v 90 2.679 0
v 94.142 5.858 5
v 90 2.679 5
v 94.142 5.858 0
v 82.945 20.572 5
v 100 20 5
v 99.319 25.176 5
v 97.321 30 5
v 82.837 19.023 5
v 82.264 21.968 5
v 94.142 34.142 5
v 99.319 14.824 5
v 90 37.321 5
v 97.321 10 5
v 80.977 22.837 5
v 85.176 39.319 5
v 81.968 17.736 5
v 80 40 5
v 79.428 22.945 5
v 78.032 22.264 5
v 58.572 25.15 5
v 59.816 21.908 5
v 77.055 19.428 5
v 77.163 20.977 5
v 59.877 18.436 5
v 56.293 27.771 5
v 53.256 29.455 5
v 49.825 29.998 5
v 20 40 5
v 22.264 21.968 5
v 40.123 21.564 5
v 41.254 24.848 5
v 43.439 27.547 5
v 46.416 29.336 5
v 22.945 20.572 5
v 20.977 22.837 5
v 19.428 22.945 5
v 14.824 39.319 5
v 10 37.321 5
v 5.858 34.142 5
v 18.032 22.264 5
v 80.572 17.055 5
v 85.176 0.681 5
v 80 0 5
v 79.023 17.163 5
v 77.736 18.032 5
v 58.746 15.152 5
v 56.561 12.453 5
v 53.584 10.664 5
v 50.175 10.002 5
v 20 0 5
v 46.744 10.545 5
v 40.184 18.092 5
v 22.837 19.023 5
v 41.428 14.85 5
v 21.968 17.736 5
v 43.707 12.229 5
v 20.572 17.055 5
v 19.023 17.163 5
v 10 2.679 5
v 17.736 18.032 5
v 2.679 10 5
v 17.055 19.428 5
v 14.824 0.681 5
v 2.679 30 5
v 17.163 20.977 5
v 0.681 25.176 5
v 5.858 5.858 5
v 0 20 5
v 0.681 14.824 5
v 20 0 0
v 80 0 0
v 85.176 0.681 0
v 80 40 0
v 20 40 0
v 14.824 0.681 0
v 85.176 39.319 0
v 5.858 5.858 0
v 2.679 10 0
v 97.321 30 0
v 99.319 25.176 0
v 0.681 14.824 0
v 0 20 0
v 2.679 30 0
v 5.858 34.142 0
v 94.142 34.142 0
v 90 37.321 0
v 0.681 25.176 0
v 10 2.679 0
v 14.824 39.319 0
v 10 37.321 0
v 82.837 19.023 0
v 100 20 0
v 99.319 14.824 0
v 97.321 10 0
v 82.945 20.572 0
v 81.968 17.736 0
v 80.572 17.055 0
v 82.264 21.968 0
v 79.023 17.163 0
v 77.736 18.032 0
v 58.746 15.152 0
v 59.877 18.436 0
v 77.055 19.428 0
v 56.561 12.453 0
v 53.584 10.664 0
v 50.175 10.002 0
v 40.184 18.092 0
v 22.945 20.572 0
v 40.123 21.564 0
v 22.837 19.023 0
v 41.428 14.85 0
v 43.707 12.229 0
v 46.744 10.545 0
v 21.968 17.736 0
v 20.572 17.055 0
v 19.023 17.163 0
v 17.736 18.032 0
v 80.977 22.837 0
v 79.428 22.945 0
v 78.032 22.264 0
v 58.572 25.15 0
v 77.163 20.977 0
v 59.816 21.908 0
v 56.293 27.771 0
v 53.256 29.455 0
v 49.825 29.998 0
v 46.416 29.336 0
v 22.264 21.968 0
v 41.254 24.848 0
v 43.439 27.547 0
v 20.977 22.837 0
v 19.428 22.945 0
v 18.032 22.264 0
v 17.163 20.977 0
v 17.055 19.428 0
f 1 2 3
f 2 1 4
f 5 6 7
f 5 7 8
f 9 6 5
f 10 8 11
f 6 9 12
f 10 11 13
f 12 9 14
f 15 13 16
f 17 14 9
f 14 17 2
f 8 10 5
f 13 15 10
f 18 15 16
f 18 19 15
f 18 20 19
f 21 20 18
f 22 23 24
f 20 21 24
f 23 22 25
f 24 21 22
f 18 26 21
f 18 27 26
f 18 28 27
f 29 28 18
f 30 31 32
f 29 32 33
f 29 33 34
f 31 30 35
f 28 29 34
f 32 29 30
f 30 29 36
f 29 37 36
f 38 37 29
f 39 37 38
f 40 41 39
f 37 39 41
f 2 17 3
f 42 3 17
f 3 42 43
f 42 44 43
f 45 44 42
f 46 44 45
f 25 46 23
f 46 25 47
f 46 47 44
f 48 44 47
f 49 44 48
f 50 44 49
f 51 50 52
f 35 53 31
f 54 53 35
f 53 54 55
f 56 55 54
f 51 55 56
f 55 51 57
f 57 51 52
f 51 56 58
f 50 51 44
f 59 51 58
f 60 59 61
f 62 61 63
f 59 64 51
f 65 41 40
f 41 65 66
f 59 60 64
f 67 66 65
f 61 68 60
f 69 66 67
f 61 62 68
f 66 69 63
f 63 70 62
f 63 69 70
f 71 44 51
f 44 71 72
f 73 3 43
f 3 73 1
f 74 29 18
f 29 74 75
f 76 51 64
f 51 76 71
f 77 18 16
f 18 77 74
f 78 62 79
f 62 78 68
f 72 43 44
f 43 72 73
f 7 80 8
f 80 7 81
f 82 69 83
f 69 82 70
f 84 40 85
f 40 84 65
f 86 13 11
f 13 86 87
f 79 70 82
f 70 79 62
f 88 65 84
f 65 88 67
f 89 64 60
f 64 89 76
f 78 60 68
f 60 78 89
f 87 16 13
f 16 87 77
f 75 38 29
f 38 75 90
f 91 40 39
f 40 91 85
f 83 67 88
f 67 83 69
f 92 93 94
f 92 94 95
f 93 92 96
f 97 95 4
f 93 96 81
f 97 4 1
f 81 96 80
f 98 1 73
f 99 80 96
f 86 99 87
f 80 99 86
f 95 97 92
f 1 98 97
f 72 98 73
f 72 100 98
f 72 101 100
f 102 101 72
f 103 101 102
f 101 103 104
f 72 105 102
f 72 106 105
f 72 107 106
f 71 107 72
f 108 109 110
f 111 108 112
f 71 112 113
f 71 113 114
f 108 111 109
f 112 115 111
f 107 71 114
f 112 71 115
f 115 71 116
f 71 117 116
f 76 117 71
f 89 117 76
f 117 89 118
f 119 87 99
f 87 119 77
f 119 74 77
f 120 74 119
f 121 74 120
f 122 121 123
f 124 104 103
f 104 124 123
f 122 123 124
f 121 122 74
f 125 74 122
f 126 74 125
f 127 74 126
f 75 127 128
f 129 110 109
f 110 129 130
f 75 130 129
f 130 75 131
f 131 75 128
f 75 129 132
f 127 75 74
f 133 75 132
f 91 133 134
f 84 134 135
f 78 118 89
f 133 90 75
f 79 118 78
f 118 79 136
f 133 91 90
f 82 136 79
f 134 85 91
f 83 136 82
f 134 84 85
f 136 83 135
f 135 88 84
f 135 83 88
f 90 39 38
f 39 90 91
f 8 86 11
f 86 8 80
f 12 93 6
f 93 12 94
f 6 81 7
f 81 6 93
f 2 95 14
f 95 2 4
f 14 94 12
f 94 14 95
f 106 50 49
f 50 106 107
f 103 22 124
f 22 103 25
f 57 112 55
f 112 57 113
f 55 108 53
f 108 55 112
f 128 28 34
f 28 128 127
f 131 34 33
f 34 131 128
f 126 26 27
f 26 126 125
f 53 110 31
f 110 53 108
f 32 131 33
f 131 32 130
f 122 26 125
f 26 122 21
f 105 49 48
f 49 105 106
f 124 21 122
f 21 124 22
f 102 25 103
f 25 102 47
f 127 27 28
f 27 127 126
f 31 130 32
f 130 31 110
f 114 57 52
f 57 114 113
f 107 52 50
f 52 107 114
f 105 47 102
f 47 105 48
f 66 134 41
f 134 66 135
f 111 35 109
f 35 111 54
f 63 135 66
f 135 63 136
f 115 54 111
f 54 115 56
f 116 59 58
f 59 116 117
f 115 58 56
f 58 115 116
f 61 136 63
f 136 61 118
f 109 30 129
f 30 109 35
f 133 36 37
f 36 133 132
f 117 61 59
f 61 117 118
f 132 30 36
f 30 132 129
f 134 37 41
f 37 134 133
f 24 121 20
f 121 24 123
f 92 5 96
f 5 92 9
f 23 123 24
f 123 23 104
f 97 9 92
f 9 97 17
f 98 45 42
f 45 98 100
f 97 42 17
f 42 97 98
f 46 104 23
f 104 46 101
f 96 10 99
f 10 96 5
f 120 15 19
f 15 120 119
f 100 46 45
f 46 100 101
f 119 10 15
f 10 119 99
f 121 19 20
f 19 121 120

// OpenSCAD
$fn = 32;

// ----------------------------------------------------------------------
// Spacer plate: obround span 60, caps R20
// ----------------------------------------------------------------------

// --- parameters (mm) ---
bore_r = 10;              // centre bore radius
bolt_r = 3;               // bolt hole radius
plate_t = 5;              // plate thickness, Z (extrusion height)
span = 60;                // obround span
cap_r = 20;               // cap radius

profile = [[20, 40], [14.824, 39.319], [10, 37.321], [5.858, 34.142], [2.679, 30], [0.681, 25.176], [0, 20], [0.681, 14.824], [2.679, 10], [5.858, 5.858], [10, 2.679], [14.824, 0.681], [20, 0], [80, 0], [85.176, 0.681], [90, 2.679], [94.142, 5.858], [97.321, 10], [99.319, 14.824], [100, 20], [99.319, 25.176], [97.321, 30], [94.142, 34.142], [90, 37.321], [85.176, 39.319], [80, 40]];  // primary outline, 26 points, counter clockwise
void_1 = [[59.816, 21.908], [58.572, 25.15], [56.293, 27.771], [53.256, 29.455], [49.825, 29.998], [46.416, 29.336], [43.439, 27.547], [41.254, 24.848], [40.123, 21.564], [40.184, 18.092], [41.428, 14.85], [43.707, 12.229], [46.744, 10.545], [50.175, 10.002], [53.584, 10.664], [56.561, 12.453], [58.746, 15.152], [59.877, 18.436]];  // centre bore, 18 points
void_2 = [[22.945, 20.572], [22.264, 21.968], [20.977, 22.837], [19.428, 22.945], [18.032, 22.264], [17.163, 20.977], [17.055, 19.428], [17.736, 18.032], [19.023, 17.163], [20.572, 17.055], [21.968, 17.736], [22.837, 19.023]];  // end hole, 12 points
void_3 = [[82.945, 20.572], [82.264, 21.968], [80.977, 22.837], [79.428, 22.945], [78.032, 22.264], [77.163, 20.977], [77.055, 19.428], [77.736, 18.032], [79.023, 17.163], [80.572, 17.055], [81.968, 17.736], [82.837, 19.023]];  // end hole, 12 points

// --- the one profile operation ---
difference() {
  linear_extrude(height = plate_t) polygon(points = profile);
  translate([0, 0, -1])
    linear_extrude(height = plate_t + 2) polygon(points = void_1);
  translate([0, 0, -1])
    linear_extrude(height = plate_t + 2) polygon(points = void_2);
  translate([0, 0, -1])
    linear_extrude(height = plate_t + 2) polygon(points = void_3);
}
